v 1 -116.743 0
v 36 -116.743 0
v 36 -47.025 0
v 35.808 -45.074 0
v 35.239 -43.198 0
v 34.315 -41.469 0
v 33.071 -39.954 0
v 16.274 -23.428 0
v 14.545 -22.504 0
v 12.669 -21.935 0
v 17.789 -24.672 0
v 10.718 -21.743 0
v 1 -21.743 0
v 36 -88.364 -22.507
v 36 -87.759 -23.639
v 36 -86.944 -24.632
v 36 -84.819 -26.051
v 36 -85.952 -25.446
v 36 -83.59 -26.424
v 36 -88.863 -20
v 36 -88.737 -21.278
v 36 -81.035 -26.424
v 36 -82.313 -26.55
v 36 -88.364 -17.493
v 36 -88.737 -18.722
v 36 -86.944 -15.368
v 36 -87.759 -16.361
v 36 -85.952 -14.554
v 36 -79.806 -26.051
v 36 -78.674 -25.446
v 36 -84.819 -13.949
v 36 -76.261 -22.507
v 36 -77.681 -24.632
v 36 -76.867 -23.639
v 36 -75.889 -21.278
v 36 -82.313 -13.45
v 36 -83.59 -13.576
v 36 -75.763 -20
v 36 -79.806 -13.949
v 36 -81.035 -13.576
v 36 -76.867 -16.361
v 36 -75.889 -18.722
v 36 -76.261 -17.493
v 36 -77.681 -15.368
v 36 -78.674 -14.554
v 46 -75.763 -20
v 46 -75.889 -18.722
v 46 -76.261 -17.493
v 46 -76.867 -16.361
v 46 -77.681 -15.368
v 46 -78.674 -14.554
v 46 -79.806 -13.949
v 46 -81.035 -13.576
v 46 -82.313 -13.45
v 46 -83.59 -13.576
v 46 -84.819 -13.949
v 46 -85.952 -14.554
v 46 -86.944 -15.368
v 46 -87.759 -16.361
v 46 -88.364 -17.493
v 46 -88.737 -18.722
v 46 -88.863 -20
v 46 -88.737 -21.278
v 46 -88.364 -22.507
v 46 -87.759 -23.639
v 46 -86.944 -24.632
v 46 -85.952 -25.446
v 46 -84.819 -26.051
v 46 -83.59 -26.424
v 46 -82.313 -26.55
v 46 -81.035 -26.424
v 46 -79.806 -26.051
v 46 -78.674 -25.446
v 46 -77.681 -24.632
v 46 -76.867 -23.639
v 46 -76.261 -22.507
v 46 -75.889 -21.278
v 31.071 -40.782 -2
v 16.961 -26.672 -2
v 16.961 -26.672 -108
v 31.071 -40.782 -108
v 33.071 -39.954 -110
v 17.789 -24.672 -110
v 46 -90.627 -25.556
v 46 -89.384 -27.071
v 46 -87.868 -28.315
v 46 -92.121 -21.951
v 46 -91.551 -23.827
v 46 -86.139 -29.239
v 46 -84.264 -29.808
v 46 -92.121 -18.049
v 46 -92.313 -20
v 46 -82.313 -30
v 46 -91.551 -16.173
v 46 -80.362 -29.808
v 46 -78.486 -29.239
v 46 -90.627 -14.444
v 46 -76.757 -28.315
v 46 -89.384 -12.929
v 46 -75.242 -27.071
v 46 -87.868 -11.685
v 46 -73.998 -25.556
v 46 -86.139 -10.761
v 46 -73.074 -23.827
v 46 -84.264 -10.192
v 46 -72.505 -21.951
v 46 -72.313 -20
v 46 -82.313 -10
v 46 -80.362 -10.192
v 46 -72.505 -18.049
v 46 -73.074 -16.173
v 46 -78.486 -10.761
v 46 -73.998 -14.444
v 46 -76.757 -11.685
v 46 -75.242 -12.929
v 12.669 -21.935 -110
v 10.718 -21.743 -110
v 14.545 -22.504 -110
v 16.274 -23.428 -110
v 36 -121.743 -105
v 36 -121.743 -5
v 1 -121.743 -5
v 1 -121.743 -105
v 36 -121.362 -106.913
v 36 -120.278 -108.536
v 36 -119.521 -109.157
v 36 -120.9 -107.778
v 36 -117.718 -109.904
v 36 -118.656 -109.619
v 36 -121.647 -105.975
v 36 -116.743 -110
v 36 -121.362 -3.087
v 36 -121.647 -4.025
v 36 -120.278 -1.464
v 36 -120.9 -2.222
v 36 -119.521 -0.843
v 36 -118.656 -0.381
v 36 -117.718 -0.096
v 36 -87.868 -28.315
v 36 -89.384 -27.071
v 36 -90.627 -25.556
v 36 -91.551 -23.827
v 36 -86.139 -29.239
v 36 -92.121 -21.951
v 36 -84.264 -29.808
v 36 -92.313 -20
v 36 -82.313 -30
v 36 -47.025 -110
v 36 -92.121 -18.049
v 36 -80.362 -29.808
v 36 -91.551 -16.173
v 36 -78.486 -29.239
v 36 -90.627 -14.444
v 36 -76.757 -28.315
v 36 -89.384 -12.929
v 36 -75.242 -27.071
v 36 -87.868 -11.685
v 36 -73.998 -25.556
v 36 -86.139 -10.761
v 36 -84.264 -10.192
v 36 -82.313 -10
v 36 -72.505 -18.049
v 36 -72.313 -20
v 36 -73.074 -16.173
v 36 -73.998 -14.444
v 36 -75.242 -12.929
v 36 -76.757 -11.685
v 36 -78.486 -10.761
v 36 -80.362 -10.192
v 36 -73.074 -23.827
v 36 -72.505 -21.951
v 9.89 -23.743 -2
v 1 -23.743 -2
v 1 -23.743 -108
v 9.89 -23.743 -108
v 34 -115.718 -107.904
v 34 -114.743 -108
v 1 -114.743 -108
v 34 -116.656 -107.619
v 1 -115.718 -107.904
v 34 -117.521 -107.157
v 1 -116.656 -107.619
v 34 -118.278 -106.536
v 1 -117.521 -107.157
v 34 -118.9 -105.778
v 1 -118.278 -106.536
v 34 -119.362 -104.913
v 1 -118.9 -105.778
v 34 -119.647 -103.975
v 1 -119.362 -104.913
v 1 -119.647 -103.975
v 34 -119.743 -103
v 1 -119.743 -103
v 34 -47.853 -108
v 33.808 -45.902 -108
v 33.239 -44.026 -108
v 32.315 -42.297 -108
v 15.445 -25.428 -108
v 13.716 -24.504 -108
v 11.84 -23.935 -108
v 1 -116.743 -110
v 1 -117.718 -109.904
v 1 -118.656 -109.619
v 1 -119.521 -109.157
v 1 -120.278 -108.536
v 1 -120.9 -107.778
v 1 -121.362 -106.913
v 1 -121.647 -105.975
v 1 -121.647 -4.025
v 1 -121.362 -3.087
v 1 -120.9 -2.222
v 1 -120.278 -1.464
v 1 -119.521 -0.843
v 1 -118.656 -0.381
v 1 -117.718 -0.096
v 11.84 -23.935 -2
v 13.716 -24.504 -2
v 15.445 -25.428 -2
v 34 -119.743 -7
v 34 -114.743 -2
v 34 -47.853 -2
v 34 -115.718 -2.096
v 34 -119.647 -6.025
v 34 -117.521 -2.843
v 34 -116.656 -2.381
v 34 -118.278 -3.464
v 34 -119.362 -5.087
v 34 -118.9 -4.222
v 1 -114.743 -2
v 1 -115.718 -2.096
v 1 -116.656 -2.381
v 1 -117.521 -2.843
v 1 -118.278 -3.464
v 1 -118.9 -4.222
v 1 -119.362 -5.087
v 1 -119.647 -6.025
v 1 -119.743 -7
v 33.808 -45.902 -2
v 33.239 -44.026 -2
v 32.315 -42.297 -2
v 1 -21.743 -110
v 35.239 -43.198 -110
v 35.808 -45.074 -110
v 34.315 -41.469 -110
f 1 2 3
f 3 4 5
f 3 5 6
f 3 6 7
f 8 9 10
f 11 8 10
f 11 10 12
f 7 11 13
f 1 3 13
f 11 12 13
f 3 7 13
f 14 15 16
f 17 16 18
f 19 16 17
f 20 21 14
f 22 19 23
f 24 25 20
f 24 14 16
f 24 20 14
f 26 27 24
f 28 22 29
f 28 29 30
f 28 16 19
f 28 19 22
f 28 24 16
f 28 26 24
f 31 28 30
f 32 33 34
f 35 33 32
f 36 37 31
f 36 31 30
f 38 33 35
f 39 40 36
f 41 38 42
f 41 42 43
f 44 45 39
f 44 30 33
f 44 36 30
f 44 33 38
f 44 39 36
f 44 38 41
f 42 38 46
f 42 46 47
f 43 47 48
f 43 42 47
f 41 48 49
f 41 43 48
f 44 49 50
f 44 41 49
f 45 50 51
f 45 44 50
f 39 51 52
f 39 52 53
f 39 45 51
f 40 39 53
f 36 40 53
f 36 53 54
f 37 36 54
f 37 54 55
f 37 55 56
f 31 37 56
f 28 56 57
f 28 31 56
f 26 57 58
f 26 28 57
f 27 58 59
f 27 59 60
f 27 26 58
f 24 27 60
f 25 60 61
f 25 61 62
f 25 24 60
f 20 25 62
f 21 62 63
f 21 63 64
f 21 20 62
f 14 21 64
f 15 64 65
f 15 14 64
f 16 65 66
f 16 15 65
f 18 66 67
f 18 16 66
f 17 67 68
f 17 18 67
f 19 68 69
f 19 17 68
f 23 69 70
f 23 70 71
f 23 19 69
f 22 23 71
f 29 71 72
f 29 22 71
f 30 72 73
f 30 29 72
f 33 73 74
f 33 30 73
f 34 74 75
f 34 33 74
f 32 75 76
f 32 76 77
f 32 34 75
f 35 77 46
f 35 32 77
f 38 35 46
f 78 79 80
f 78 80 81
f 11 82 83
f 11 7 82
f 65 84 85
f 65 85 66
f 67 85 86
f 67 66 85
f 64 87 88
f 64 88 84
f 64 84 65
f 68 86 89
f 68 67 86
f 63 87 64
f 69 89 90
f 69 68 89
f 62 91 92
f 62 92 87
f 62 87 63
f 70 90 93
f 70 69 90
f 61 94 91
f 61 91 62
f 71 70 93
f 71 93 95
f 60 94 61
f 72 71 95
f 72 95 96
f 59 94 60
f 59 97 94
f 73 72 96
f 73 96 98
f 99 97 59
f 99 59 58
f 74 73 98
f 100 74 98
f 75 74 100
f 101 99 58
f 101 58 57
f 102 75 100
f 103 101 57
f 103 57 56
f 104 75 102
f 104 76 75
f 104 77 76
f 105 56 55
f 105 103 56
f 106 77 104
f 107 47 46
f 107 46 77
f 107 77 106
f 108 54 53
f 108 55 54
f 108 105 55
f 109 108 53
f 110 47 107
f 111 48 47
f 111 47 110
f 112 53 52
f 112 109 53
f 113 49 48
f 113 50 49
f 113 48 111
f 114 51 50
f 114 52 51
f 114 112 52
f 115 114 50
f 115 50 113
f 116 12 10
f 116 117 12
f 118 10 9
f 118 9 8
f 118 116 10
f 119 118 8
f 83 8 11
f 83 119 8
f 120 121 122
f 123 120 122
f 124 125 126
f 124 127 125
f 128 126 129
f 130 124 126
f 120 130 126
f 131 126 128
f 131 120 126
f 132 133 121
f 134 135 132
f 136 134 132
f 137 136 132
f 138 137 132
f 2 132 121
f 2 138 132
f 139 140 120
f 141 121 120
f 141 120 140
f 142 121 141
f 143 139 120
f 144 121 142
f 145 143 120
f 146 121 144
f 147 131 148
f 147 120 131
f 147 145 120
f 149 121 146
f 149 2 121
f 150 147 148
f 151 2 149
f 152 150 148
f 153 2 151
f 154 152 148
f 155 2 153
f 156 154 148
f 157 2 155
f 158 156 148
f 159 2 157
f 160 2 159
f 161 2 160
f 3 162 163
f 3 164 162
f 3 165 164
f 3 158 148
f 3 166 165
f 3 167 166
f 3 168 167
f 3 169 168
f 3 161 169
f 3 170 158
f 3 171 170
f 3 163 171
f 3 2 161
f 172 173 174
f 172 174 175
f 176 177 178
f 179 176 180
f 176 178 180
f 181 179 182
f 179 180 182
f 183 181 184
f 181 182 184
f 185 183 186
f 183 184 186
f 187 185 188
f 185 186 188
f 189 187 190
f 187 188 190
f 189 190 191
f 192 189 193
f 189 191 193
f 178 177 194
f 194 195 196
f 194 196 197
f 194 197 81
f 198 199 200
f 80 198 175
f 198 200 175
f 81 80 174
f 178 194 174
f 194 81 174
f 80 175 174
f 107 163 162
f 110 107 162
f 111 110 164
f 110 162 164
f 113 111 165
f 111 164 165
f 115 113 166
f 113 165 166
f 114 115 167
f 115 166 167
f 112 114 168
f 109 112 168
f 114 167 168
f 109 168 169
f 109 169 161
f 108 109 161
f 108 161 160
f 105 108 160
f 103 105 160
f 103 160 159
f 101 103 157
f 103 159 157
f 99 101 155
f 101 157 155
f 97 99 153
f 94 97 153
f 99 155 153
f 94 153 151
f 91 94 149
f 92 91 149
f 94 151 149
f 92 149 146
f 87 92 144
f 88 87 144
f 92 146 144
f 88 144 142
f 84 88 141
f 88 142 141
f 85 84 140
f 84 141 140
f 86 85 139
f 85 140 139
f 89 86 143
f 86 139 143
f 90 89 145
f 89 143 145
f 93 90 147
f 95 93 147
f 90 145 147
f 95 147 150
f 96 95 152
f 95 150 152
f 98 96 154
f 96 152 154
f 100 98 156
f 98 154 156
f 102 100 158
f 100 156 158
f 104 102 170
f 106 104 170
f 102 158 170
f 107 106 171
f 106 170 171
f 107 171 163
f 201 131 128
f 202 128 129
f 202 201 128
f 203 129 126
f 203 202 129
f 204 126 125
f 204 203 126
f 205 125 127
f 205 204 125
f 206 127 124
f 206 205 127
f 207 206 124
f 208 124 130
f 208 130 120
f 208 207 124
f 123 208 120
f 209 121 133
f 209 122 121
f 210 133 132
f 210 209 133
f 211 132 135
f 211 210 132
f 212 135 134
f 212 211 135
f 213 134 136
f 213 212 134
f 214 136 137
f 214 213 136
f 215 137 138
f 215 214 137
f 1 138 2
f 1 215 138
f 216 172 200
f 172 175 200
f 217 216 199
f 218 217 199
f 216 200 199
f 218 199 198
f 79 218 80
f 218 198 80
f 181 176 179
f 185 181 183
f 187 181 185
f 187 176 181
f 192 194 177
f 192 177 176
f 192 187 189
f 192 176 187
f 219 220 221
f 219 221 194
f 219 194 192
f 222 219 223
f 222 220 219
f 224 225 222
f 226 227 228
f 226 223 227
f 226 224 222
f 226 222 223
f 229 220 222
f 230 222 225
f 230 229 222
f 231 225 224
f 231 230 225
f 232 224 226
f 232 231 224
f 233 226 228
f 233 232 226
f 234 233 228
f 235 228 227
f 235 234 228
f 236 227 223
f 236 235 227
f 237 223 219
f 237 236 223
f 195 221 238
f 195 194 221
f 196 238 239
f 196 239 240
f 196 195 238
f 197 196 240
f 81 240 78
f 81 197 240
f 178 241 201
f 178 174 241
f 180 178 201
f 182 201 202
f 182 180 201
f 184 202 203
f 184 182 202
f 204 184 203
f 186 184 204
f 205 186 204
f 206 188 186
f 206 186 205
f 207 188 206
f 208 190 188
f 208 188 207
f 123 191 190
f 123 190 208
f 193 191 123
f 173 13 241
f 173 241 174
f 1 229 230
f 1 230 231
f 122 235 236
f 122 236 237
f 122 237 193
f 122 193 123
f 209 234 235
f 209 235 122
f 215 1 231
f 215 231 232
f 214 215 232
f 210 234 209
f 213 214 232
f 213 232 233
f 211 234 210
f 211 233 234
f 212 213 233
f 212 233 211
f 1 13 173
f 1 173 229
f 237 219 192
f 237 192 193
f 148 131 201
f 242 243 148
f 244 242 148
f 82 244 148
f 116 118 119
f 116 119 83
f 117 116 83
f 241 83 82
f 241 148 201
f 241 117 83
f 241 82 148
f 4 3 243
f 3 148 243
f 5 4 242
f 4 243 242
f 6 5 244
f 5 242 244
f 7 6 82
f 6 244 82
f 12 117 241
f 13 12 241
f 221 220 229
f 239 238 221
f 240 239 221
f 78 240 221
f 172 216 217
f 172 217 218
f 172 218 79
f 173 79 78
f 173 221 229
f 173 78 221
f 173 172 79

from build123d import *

# Parameters (mm, degrees)
BOSS_EXTRUDE1_DEPTH = 2
BOSS_EXTRUDE2_DEPTH = 2
BOSS_EXTRUDE3_DEPTH = 106
SKETCH4_R           = 10
SKETCH4_R_2         = 6.55
BOSS_EXTRUDE4_DEPTH = 10
FILLET1_R           = 5
FILLET2_R           = 10


with BuildPart() as part:
    # Sketch1 → Boss-Extrude1 (new body)
    with BuildSketch(Plane.XY):
        Polygon((1, -21.742716482), (14.860117326, -21.742716482), (36, -42.882599156), (36, -121.742716482), (1, -121.742716482), align=None)
    extrude(amount=-BOSS_EXTRUDE1_DEPTH)



with BuildPart() as body_2:
    # Sketch2 → Boss-Extrude2 (new body)
    with BuildSketch(Plane(origin=(0, 0, -110), x_dir=(-1, 0, 0), z_dir=(0, 0, -1))):
        Polygon((-1, -121.742716482), (-1, -21.742716482), (-14.860117326, -21.742716482), (-36, -42.882599156), (-36, -121.742716482), align=None)
    extrude(amount=-BOSS_EXTRUDE2_DEPTH)


with BuildPart() as part_1:
    add(part.part)

    add(body_2.part)  # Boss-Extrude3 merges body 2
    # Sketch3 → Boss-Extrude3 (add)
    with BuildSketch(Plane(origin=(0, 0, -2), x_dir=(-1, 0, 0), z_dir=(0, 0, -1))):
        Polygon((-1, -23.742716482), (-14.031690201, -23.742716482), (-34, -43.71102628), (-34, -119.742716482), (-1, -119.742716482), (-1, -121.742716482), (-36, -121.742716482), (-36, -42.882599156), (-14.860117326, -21.742716482), (-1, -21.742716482), align=None)
    extrude(amount=BOSS_EXTRUDE3_DEPTH)

    # Sketch4 → Boss-Extrude4 (add)
    with BuildSketch(Plane(origin=(36, 0, 0), x_dir=(0, 0, -1), z_dir=(1, 0, 0))):
        with Locations(Location((20, -82.312657819, 0), (0, 0, 90))):
            Circle(SKETCH4_R)
        with Locations(Location((20, -82.312657819, 0), (0, 0, 90))):
            Circle(SKETCH4_R_2, mode=Mode.SUBTRACT)
    extrude(amount=BOSS_EXTRUDE4_DEPTH)

    # Fillet1
    fillet1_edges = [part_1.edges().sort_by_distance(p)[0] for p in [
        (17.5, -119.742716482, -2),
        (17.5, -119.742716482, -108),
        (18.5, -121.742716482, -110),
        (18.5, -121.742716482, 0),
    ]]
    fillet(fillet1_edges, radius=FILLET1_R)

    # Fillet2
    fillet2_edges = [part_1.edges().sort_by_distance(p)[0] for p in [
        (34, -43.71102628, -55),
        (14.031690201, -23.742716482, -55),
        (14.860117326, -21.742716482, -55),
        (36, -42.882599156, -55),
    ]]
    fillet(fillet2_edges, radius=FILLET2_R)


solid = part_1.part
